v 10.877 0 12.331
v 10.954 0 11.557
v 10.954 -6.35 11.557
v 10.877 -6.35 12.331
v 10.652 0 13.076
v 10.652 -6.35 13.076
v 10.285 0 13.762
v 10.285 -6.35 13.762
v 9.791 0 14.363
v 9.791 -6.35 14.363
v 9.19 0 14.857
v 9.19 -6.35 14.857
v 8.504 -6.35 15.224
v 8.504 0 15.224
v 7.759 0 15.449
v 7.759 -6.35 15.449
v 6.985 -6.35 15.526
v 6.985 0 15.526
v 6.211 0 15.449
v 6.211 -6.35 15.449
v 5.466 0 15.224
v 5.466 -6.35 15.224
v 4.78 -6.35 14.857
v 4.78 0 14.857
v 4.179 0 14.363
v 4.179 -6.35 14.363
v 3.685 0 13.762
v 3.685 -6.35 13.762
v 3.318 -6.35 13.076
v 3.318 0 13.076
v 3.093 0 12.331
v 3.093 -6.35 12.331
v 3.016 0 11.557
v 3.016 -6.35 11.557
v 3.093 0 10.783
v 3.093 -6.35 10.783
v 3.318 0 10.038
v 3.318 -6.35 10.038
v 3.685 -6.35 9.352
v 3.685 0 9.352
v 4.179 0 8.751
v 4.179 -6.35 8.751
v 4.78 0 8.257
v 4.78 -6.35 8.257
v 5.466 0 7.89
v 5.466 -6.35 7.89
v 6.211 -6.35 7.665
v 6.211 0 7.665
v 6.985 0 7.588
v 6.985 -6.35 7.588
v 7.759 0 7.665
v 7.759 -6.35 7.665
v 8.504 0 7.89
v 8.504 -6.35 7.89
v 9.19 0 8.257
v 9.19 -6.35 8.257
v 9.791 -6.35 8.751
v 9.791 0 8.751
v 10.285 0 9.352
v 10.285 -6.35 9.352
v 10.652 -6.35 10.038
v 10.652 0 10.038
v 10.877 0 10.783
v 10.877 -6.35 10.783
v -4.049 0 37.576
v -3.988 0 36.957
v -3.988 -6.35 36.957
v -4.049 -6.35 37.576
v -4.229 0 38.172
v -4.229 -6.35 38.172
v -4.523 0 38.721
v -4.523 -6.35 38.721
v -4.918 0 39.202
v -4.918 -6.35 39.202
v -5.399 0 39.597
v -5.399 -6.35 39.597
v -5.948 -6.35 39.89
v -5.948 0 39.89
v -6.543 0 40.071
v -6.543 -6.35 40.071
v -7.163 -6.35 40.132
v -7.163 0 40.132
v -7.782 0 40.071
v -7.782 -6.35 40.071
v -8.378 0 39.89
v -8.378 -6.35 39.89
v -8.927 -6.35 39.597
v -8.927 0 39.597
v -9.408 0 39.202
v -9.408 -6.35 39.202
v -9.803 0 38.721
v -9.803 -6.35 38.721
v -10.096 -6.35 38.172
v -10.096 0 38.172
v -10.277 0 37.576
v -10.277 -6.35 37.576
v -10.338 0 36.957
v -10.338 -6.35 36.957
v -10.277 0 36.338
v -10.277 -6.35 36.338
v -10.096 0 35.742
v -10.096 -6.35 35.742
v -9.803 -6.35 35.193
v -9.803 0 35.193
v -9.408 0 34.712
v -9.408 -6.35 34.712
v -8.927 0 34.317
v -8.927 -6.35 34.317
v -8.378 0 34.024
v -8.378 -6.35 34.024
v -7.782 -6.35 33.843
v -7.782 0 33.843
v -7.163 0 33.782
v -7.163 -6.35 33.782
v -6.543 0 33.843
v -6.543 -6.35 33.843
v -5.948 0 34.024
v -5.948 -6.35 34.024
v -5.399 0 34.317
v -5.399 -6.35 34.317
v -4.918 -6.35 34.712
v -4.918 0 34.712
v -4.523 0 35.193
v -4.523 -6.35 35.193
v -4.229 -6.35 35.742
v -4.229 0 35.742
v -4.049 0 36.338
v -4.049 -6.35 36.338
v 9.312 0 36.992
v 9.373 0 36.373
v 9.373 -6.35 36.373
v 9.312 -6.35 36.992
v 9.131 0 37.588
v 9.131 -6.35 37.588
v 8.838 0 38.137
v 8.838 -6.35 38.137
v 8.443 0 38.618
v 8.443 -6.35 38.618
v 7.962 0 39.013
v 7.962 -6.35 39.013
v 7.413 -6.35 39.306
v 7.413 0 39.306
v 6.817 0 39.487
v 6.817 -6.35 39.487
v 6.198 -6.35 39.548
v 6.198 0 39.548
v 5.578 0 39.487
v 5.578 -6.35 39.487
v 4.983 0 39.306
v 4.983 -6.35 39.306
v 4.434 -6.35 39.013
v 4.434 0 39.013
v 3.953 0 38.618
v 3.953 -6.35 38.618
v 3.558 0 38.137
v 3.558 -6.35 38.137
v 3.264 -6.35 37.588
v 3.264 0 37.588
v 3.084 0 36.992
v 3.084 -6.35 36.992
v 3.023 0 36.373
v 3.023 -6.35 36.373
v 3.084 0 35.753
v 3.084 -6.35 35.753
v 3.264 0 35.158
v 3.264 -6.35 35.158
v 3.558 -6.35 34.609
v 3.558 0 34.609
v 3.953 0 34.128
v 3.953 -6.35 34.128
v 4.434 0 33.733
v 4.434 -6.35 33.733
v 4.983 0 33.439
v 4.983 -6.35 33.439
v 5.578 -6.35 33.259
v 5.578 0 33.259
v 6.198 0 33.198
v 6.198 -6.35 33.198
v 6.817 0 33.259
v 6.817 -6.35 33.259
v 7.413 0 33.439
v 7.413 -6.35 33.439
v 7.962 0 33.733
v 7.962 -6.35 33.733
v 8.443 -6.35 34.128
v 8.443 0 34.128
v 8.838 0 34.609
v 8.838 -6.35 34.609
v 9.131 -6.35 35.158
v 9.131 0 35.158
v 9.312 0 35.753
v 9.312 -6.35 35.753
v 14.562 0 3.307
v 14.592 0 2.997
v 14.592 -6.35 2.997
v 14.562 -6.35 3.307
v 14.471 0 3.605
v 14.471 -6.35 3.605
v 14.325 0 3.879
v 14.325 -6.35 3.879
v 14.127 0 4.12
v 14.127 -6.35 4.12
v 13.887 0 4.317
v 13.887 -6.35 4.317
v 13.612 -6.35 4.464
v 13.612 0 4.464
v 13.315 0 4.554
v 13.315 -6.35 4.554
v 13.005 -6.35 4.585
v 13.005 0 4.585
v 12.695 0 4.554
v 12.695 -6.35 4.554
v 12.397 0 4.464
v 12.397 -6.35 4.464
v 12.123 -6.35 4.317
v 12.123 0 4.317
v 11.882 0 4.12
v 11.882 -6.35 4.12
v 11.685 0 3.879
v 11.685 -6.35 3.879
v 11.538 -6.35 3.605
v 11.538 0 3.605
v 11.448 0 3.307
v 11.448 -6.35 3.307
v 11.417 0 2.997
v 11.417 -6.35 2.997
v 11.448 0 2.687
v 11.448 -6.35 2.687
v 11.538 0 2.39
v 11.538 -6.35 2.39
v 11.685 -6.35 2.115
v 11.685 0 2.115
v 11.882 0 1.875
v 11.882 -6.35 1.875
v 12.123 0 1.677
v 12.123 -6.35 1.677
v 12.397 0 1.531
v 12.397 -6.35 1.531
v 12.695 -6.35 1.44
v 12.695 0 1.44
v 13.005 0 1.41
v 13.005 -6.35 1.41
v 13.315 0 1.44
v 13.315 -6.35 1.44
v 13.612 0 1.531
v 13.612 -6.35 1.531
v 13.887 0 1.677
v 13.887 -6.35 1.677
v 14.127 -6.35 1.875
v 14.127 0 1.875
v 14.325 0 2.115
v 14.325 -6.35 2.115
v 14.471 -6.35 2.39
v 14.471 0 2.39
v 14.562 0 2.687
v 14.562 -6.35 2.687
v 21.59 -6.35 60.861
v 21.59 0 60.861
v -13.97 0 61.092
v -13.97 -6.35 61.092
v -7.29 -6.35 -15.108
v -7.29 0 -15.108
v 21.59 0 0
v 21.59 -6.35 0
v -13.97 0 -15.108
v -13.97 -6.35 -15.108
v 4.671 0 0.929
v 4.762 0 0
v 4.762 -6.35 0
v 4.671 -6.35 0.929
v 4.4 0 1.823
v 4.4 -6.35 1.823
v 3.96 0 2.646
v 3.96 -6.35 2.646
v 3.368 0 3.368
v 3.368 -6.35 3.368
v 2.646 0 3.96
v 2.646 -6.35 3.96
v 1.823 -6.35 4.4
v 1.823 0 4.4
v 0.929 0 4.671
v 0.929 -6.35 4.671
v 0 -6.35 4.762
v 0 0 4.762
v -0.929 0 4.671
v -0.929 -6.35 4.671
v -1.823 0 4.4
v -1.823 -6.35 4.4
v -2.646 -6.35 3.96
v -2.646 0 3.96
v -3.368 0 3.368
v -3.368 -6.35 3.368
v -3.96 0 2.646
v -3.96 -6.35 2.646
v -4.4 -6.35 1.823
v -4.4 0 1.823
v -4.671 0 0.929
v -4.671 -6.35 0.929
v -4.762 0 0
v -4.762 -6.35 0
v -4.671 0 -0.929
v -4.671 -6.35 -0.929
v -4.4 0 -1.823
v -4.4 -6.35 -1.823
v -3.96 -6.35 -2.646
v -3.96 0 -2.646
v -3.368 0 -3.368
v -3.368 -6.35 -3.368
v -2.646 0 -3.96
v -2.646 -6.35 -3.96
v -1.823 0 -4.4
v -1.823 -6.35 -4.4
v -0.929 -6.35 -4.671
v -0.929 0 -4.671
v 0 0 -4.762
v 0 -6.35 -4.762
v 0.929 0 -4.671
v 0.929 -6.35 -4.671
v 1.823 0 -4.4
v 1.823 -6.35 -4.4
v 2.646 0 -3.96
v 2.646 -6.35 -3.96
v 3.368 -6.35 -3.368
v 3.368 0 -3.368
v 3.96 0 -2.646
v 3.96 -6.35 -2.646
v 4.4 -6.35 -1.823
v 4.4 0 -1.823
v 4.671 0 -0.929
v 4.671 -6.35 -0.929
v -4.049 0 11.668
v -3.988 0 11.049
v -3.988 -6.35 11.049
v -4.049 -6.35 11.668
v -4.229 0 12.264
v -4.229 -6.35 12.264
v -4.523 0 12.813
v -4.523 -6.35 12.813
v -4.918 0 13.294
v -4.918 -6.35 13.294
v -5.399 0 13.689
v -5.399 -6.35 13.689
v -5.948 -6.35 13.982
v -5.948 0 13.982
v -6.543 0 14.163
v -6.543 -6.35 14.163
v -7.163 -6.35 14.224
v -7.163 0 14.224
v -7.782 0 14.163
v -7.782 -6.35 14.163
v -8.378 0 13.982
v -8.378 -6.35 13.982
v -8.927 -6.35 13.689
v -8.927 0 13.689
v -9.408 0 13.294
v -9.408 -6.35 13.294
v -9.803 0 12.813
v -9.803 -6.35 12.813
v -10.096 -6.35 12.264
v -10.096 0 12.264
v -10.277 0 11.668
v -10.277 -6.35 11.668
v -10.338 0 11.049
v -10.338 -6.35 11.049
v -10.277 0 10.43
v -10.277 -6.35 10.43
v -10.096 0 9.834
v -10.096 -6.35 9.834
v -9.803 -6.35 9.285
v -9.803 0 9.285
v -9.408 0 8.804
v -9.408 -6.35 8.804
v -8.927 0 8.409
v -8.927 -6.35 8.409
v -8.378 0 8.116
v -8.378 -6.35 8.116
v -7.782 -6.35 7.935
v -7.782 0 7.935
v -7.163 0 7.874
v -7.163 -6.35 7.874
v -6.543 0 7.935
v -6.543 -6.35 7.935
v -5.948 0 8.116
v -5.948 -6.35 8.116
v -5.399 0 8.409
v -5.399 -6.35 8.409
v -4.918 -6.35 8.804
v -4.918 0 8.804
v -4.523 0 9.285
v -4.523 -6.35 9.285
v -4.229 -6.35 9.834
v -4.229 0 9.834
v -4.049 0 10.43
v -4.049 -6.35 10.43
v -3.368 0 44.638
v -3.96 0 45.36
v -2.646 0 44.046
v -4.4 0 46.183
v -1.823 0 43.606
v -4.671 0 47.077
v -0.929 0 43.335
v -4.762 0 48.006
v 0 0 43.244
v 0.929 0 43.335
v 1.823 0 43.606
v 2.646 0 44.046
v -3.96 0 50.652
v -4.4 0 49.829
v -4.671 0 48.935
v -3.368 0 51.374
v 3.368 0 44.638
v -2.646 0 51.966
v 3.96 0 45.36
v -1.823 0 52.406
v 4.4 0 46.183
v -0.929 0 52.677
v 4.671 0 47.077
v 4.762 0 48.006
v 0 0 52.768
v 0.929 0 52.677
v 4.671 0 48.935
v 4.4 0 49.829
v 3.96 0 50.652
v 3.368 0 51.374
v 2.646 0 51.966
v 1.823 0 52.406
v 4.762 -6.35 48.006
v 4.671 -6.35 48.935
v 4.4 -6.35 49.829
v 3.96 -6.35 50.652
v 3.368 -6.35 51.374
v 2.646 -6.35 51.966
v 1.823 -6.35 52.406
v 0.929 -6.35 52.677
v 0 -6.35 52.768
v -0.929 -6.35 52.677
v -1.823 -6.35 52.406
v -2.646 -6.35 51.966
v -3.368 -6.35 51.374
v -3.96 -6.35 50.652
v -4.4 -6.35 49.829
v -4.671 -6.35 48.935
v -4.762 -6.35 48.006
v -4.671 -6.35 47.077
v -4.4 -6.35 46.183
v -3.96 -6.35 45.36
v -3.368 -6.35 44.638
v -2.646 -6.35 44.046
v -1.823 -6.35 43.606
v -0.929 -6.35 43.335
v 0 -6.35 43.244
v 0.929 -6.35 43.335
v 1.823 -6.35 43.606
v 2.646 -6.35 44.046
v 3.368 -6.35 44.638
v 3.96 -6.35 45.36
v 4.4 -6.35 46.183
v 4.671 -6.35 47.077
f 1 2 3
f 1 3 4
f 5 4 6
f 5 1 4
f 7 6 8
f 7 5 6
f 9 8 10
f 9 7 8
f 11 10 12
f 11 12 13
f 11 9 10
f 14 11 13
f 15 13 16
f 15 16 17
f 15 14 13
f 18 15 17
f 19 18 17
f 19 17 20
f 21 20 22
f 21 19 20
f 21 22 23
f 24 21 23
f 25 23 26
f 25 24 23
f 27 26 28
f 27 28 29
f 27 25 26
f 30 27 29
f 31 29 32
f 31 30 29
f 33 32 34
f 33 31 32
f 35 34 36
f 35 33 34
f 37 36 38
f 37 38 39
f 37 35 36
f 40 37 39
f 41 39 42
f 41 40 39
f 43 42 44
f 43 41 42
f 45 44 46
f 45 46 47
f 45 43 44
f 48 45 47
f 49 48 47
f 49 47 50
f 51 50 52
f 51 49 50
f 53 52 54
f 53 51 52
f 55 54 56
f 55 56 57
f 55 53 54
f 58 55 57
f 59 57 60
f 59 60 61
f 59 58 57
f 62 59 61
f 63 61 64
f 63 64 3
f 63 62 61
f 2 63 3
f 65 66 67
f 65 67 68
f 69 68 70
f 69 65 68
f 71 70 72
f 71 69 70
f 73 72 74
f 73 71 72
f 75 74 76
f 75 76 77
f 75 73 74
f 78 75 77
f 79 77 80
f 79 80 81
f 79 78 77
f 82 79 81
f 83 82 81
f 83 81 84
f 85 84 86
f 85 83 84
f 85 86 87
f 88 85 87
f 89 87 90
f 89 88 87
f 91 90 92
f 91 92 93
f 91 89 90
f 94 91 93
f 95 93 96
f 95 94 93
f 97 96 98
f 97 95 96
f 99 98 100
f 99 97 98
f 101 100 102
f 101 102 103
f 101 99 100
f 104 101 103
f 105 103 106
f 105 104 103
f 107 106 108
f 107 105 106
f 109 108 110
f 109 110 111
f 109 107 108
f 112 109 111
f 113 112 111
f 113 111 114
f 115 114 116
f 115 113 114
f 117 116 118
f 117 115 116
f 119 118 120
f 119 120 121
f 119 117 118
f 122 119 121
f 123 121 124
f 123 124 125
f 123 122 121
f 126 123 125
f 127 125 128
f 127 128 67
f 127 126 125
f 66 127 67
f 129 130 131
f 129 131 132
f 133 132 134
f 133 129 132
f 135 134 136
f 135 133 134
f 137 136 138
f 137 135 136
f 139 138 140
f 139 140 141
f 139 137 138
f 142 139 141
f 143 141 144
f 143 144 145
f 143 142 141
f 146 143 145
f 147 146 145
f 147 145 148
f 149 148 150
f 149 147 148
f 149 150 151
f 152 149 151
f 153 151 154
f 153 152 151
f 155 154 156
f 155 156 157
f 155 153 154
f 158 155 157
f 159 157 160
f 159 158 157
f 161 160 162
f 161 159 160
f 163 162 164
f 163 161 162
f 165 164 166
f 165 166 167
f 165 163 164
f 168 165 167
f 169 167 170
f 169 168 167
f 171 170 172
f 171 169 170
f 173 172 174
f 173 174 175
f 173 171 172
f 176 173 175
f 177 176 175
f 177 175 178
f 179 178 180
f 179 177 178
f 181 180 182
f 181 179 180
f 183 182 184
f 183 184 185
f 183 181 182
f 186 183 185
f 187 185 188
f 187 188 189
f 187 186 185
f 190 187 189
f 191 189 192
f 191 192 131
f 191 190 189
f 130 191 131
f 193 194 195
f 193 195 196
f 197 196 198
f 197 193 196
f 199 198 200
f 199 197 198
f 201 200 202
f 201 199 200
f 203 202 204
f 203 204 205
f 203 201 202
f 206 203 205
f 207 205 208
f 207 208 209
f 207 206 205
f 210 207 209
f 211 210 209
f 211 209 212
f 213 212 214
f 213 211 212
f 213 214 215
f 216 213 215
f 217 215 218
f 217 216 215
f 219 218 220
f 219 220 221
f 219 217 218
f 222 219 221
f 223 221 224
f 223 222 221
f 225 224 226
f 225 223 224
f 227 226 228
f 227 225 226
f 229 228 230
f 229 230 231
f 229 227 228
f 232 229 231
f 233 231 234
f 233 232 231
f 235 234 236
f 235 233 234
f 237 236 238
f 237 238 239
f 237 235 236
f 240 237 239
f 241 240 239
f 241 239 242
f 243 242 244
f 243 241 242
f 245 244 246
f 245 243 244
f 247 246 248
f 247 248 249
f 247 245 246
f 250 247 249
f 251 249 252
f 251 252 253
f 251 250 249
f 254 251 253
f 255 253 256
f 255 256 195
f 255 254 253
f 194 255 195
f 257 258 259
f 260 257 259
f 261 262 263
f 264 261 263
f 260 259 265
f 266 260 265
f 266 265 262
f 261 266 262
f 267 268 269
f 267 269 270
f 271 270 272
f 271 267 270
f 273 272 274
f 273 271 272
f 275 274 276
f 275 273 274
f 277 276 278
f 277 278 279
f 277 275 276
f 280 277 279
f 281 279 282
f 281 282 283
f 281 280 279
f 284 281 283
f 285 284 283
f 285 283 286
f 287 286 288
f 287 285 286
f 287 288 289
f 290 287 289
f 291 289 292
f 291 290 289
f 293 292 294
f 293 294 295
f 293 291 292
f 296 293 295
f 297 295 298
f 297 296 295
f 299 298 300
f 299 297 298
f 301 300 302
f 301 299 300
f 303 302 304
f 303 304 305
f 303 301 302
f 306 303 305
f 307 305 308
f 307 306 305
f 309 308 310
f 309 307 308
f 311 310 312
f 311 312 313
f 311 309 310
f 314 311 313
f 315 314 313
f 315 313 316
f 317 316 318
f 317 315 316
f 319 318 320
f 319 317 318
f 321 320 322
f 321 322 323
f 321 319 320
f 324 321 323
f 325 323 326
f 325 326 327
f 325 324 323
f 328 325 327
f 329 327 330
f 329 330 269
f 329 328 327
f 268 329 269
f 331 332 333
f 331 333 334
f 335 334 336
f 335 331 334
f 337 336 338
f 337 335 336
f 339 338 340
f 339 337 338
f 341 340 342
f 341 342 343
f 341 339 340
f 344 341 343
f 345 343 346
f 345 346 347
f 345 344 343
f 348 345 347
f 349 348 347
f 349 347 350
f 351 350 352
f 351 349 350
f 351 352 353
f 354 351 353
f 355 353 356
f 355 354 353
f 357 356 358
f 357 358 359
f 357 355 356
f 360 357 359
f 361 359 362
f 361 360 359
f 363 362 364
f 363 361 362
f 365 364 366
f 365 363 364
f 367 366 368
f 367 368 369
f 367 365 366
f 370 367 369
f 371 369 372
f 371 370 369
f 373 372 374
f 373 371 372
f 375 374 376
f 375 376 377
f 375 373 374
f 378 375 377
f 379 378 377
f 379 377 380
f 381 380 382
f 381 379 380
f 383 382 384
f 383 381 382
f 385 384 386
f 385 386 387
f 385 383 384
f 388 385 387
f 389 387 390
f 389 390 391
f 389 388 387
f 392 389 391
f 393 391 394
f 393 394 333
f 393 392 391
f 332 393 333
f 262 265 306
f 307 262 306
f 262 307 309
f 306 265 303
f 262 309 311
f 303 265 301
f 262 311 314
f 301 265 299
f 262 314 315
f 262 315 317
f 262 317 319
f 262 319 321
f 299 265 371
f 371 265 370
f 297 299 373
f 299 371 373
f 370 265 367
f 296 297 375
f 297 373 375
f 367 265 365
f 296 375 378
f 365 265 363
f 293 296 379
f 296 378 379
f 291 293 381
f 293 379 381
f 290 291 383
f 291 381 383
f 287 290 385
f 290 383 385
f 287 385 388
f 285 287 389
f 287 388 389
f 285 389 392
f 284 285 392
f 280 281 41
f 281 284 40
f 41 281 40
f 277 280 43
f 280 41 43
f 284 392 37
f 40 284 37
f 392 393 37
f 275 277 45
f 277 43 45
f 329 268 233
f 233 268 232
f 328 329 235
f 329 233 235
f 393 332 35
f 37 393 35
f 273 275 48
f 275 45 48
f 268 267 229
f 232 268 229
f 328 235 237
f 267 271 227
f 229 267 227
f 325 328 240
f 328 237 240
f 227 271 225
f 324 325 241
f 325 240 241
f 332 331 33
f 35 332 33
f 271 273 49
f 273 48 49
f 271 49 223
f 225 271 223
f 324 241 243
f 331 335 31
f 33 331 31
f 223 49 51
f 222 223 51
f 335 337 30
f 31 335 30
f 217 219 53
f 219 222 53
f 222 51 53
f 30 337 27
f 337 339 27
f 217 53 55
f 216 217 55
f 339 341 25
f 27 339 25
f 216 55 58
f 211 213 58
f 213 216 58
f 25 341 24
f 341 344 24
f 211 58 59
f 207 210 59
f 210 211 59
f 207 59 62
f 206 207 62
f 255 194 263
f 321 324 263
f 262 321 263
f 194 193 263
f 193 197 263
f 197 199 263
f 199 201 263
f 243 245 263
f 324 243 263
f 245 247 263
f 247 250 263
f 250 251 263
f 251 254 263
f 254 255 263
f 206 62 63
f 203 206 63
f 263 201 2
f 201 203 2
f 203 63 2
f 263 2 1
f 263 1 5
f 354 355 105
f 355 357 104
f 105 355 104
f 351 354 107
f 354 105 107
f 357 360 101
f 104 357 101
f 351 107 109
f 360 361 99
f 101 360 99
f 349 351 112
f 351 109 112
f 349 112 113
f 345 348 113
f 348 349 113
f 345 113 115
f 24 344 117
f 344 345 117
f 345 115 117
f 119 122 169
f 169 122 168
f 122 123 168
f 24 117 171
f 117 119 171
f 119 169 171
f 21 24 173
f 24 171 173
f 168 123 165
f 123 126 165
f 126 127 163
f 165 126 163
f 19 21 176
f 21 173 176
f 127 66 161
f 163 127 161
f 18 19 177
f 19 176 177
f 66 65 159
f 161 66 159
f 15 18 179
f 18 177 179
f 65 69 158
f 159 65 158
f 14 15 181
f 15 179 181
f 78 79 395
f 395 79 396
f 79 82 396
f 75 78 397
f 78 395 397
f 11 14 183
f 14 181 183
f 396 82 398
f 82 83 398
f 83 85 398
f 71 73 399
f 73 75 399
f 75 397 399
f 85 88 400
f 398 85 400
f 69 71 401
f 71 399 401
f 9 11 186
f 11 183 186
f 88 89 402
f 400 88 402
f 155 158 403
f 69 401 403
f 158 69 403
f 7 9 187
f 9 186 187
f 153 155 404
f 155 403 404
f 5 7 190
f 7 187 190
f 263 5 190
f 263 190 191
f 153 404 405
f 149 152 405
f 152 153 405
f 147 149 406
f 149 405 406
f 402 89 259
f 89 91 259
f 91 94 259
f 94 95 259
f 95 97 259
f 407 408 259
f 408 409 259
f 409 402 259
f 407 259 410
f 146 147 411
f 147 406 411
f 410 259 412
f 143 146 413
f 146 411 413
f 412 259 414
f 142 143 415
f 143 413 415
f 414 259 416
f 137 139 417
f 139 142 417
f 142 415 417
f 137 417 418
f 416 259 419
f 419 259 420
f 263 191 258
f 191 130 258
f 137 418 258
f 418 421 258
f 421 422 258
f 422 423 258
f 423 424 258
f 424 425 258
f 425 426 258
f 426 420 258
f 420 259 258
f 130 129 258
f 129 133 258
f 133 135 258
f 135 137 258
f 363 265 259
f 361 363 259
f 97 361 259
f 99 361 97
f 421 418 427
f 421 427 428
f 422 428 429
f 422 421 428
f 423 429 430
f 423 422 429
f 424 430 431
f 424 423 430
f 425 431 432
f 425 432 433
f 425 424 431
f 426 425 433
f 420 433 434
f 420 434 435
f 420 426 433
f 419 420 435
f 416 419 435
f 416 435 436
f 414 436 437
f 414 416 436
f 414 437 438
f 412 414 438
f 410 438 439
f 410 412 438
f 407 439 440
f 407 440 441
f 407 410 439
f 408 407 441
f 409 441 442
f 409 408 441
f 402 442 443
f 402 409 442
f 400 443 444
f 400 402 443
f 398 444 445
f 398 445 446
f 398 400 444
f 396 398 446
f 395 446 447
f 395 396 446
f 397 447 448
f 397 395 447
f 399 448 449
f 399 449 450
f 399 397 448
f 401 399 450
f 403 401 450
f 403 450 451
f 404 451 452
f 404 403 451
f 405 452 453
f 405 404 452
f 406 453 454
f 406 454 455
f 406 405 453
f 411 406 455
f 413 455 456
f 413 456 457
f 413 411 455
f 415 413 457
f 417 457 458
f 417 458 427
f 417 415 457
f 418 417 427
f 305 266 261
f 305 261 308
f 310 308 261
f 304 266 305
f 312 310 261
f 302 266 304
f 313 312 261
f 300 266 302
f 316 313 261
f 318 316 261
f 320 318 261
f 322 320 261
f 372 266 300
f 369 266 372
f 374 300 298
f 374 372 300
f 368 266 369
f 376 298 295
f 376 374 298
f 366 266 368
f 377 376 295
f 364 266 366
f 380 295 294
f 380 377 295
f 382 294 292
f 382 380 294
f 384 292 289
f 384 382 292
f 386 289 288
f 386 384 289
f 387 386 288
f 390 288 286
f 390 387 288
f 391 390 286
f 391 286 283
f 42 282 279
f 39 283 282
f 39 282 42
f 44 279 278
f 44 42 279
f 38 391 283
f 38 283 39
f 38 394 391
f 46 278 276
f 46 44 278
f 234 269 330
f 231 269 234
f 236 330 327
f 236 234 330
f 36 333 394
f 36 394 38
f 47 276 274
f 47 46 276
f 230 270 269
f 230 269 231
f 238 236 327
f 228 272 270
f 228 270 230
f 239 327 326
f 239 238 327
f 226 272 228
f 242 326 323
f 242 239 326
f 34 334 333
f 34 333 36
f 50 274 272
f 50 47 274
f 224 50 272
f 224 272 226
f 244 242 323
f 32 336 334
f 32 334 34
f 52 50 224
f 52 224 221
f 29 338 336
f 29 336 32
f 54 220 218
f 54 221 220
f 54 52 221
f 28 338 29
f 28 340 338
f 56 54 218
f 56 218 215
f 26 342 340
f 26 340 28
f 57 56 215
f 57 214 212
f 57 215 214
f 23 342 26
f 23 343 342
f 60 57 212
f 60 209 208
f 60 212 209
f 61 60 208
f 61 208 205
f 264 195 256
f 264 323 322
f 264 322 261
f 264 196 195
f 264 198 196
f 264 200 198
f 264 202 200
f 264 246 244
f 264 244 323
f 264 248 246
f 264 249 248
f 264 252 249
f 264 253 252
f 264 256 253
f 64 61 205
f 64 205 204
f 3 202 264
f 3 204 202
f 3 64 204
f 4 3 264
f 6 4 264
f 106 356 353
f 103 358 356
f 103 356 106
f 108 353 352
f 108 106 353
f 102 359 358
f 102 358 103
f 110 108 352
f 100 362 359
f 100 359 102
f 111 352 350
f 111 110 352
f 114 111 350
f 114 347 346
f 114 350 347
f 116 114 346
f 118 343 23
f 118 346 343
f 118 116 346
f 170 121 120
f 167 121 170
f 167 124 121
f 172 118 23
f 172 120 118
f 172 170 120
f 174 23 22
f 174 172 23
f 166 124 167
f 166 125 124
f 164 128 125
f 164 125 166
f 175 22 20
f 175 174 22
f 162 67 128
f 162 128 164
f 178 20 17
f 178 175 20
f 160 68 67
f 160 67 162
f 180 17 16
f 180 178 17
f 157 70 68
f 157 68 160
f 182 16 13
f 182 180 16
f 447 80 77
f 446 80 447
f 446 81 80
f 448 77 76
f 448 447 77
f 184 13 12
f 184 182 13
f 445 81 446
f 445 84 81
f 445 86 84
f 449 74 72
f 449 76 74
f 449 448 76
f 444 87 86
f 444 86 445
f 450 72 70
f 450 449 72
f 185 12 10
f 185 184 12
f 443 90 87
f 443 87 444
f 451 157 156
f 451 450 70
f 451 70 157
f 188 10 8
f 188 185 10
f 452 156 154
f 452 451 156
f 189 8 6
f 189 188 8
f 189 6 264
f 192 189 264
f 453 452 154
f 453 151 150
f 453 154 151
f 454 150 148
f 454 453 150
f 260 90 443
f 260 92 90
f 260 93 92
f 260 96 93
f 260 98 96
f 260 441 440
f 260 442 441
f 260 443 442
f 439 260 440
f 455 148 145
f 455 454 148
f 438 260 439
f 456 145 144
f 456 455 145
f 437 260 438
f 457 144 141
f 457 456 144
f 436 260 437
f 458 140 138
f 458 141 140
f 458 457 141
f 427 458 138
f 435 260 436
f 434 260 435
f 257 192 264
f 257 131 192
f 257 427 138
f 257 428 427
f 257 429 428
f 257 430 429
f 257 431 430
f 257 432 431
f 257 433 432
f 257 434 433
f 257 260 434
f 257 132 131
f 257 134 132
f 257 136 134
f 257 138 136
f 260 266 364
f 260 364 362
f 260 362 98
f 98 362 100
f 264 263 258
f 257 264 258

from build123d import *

# Parameters (mm, degrees)
F0_R     = 4.7625
F0_R_2   = 3.175
F0_R_3   = 1.5875
F0_R_4   = 3.96875
F1_DEPTH = 6.35


with BuildPart() as f1:
    # F0 (on Front) → F1 (new body)
    with BuildSketch(Plane.XZ):
        Polygon((-13.97, 61.09232), (-13.97, -15.10768), (-7.2898, -15.10768), (21.59, 0), (21.59, 60.86069), align=None)
        Circle(F0_R, mode=Mode.SUBTRACT)
        with Locations((-7.1628, 11.049)):
            Circle(F0_R_2, mode=Mode.SUBTRACT)
        with Locations((13.0048, 2.9972)):
            Circle(F0_R_3, mode=Mode.SUBTRACT)
        with Locations((6.985, 11.557)):
            Circle(F0_R_4, mode=Mode.SUBTRACT)
        with Locations((-7.1628, 36.957)):
            Circle(F0_R_2, mode=Mode.SUBTRACT)
        with Locations((0, 48.006)):
            Circle(F0_R, mode=Mode.SUBTRACT)
        with Locations((6.1976, 36.3728)):
            Circle(F0_R_2, mode=Mode.SUBTRACT)
    extrude(amount=F1_DEPTH)


solid = f1.part
